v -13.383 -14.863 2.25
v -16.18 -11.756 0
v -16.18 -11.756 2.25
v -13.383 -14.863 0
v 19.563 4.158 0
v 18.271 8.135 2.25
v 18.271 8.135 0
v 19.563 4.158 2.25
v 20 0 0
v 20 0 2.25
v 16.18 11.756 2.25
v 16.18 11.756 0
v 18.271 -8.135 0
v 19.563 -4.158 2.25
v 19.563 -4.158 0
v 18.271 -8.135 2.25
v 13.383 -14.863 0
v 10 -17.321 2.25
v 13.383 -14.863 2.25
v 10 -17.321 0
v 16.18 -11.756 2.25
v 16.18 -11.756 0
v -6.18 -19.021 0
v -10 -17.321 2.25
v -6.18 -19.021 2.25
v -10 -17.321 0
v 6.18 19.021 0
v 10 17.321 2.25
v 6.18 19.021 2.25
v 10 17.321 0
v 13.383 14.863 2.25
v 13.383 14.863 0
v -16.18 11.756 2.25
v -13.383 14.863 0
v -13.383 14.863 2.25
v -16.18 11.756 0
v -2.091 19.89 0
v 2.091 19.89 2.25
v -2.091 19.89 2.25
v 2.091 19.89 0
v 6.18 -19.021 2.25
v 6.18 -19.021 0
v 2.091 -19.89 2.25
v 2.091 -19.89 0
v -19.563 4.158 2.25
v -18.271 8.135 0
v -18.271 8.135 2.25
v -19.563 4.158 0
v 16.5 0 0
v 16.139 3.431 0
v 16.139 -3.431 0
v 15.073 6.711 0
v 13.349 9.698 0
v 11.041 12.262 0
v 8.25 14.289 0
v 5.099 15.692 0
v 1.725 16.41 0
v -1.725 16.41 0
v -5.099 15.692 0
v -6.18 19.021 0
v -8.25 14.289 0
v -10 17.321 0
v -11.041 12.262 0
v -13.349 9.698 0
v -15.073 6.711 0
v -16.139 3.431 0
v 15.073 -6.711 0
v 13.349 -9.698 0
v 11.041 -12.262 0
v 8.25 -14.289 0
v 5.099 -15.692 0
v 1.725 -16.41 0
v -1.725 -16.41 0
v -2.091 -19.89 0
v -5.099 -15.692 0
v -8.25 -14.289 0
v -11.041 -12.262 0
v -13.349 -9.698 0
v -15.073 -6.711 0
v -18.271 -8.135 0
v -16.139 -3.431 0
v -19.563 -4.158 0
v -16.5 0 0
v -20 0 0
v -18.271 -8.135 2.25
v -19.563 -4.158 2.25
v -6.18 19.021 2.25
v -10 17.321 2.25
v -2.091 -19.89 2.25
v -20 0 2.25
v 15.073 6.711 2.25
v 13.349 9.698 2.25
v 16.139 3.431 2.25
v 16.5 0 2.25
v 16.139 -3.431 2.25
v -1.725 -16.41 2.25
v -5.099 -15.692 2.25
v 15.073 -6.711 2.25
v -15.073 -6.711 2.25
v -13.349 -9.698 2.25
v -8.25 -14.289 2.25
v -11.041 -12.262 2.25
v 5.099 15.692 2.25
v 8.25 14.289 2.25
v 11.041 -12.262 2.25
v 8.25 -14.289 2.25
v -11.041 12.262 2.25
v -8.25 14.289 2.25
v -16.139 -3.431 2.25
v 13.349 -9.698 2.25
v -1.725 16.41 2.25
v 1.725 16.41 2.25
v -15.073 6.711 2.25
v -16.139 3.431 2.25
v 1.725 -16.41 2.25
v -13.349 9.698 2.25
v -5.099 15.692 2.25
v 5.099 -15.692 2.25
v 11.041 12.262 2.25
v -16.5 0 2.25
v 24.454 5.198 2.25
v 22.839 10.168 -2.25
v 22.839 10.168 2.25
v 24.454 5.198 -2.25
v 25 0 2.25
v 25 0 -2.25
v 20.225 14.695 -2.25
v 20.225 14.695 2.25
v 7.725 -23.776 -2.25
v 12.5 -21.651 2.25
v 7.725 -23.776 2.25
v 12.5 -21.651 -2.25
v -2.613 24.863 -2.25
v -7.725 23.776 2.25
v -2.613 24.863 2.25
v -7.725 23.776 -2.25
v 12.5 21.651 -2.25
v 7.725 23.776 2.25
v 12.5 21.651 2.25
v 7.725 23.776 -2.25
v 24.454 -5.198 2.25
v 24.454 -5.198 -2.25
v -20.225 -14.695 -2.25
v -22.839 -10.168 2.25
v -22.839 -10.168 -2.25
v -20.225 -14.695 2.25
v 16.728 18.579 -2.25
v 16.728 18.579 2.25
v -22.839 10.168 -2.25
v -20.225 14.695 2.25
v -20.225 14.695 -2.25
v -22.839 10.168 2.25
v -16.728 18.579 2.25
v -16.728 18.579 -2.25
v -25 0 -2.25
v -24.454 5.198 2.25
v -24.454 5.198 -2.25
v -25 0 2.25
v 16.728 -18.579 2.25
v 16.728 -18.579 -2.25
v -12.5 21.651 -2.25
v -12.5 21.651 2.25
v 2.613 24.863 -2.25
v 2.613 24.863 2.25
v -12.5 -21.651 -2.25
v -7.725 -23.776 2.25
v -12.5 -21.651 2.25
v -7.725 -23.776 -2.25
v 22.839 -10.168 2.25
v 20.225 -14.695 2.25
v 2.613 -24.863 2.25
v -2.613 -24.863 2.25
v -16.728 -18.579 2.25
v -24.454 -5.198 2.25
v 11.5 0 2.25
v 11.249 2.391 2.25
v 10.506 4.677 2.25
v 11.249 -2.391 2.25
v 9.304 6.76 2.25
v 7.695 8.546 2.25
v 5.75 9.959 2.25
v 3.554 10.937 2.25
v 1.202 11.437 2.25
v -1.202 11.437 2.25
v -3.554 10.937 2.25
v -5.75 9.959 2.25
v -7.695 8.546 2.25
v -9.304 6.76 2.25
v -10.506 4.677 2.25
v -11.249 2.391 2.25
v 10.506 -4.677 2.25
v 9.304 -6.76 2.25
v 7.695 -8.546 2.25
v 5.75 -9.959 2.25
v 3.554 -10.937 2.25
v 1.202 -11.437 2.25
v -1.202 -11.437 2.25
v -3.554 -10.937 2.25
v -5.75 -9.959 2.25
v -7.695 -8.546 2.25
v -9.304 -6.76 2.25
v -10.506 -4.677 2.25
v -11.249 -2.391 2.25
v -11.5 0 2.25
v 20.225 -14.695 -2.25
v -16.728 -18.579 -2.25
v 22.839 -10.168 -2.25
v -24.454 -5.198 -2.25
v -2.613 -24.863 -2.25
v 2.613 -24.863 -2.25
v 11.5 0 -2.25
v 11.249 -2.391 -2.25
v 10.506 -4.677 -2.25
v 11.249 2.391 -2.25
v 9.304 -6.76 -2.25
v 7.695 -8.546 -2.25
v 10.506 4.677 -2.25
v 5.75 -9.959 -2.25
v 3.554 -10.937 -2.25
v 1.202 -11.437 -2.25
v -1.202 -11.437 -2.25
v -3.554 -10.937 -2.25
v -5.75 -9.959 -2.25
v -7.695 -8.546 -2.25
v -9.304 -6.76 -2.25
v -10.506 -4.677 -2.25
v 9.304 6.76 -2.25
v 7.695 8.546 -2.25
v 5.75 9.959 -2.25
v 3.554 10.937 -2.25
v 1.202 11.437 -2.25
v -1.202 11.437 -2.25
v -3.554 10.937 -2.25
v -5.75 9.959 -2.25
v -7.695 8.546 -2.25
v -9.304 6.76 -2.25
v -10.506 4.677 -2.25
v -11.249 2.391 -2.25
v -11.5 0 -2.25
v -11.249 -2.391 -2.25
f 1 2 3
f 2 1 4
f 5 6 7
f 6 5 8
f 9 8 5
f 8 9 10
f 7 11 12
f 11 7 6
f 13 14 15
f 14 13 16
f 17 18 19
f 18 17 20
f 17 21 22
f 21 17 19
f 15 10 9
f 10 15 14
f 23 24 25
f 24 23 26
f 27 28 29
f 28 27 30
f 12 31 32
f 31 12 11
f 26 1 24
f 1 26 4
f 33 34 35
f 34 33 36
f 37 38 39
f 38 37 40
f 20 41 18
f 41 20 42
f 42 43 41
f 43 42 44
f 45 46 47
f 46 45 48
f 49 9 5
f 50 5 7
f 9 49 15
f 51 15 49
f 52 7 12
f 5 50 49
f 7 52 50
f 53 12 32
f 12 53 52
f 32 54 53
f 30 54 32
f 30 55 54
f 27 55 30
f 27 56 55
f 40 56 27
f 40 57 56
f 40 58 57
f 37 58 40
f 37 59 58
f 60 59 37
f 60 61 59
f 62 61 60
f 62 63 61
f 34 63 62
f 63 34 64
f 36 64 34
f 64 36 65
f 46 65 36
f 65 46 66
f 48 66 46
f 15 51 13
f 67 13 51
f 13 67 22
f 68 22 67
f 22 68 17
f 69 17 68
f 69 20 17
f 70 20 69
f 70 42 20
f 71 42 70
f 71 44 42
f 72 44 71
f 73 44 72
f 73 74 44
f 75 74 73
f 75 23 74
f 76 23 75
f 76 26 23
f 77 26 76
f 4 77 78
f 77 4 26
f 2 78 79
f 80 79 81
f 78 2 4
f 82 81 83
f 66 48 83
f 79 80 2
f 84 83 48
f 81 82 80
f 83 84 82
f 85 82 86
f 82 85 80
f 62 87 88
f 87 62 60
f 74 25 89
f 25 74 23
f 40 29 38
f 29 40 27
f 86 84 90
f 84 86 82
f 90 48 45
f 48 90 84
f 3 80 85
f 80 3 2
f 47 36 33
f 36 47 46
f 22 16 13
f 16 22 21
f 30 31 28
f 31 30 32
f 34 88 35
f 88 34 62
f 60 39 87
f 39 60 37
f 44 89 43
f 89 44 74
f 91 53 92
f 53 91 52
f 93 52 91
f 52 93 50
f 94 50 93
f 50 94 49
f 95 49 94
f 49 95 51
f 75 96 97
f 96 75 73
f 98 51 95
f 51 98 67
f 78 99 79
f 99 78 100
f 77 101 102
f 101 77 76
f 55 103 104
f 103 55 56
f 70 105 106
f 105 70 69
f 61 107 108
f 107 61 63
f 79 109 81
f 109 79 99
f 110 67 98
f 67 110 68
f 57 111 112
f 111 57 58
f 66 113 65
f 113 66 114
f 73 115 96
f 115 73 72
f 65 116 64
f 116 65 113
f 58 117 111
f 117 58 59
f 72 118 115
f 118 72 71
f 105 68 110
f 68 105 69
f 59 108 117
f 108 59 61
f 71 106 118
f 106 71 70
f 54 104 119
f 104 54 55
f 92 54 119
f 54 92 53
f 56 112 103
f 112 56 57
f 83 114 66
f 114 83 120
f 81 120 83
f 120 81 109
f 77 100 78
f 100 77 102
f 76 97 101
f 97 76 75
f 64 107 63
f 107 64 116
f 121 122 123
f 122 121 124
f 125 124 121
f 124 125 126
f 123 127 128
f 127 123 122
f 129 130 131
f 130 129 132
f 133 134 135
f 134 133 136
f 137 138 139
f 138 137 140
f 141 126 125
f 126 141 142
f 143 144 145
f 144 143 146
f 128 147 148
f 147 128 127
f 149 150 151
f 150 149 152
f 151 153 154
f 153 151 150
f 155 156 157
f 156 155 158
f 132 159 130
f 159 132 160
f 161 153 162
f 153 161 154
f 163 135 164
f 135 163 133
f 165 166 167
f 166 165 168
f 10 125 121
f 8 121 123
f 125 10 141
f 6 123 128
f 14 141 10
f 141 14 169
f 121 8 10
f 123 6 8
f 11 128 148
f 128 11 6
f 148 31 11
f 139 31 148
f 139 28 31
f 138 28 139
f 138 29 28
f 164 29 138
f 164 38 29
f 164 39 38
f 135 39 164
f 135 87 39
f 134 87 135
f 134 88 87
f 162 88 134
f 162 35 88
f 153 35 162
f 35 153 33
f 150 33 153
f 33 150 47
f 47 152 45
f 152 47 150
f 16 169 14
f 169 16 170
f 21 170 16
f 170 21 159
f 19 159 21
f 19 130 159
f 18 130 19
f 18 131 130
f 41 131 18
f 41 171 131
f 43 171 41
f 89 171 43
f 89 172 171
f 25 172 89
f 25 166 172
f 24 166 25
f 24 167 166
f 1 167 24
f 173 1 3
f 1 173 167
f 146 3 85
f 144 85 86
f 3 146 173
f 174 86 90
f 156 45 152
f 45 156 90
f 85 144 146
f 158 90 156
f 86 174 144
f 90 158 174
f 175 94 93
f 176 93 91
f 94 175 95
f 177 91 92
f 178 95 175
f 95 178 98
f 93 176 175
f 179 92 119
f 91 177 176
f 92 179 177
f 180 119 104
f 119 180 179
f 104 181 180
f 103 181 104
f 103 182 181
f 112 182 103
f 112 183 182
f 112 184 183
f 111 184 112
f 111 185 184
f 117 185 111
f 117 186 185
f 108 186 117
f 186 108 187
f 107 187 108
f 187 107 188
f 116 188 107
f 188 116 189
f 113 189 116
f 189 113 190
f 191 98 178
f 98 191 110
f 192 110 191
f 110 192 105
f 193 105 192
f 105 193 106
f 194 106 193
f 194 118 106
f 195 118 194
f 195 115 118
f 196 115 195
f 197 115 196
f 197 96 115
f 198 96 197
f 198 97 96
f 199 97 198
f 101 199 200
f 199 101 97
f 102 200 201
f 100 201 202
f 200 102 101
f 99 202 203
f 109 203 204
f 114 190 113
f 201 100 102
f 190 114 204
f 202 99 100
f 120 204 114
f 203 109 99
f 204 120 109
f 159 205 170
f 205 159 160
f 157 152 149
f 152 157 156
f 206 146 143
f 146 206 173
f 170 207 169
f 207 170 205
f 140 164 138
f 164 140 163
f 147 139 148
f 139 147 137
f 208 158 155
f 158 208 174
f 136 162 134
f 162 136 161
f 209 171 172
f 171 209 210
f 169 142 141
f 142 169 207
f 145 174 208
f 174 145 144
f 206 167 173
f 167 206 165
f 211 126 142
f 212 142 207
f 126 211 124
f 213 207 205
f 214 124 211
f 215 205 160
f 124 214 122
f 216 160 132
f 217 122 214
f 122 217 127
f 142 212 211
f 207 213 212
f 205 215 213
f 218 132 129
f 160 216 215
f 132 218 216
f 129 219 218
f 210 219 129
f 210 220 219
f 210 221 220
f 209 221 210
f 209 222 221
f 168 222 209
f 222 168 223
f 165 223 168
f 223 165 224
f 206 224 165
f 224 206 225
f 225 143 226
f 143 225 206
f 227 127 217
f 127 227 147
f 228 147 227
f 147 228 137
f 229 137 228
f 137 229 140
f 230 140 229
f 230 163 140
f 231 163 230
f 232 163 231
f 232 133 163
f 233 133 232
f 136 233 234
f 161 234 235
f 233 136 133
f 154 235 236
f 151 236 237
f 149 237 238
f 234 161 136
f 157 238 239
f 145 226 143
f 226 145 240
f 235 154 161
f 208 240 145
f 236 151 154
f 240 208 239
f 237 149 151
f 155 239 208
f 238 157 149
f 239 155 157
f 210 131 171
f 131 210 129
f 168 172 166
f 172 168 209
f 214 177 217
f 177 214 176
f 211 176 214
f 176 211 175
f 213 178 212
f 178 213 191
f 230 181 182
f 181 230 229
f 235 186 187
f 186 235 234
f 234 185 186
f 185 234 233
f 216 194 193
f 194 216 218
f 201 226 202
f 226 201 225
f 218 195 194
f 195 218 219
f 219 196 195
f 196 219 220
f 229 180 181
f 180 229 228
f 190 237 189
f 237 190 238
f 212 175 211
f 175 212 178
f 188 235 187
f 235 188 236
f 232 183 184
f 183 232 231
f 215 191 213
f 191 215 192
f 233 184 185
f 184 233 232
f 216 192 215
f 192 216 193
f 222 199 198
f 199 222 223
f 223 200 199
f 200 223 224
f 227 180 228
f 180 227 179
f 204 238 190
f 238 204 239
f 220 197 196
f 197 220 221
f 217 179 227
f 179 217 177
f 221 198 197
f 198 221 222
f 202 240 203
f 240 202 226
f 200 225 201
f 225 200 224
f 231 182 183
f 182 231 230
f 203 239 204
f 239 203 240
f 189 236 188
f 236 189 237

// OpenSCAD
						//DICHIARAZIONI:                     		// DECLARATIONS:

r1=16.5;    //diametro interno guarnizione					// inner diameter seal
r2=20 ;   //diametro esterno guarnizione					// ??outer diameter seal
s=2.5;      //spessore guarnizione						// thickness seal

						//IMPOSTAZIONI FUNZIONI					// FUNCTION SETTINGS

rs1=r1-5; //diametro interno supporto						// inner diameter support
rs2=r2+5; //diametro esterno supporto						// outer diameter support
ss=s+2;      //spessore supporto							// thickness support

						//GUARNIZIONE									// SEAL

difference()
{
cylinder(h=ss,r=rs2,center=true);
cylinder(h=ss+2,r=rs1,center=true);
difference()
{
cylinder(h=s,r=r2,center=true+1);
cylinder(h=s,r=r1,center=true+1);
}
}
